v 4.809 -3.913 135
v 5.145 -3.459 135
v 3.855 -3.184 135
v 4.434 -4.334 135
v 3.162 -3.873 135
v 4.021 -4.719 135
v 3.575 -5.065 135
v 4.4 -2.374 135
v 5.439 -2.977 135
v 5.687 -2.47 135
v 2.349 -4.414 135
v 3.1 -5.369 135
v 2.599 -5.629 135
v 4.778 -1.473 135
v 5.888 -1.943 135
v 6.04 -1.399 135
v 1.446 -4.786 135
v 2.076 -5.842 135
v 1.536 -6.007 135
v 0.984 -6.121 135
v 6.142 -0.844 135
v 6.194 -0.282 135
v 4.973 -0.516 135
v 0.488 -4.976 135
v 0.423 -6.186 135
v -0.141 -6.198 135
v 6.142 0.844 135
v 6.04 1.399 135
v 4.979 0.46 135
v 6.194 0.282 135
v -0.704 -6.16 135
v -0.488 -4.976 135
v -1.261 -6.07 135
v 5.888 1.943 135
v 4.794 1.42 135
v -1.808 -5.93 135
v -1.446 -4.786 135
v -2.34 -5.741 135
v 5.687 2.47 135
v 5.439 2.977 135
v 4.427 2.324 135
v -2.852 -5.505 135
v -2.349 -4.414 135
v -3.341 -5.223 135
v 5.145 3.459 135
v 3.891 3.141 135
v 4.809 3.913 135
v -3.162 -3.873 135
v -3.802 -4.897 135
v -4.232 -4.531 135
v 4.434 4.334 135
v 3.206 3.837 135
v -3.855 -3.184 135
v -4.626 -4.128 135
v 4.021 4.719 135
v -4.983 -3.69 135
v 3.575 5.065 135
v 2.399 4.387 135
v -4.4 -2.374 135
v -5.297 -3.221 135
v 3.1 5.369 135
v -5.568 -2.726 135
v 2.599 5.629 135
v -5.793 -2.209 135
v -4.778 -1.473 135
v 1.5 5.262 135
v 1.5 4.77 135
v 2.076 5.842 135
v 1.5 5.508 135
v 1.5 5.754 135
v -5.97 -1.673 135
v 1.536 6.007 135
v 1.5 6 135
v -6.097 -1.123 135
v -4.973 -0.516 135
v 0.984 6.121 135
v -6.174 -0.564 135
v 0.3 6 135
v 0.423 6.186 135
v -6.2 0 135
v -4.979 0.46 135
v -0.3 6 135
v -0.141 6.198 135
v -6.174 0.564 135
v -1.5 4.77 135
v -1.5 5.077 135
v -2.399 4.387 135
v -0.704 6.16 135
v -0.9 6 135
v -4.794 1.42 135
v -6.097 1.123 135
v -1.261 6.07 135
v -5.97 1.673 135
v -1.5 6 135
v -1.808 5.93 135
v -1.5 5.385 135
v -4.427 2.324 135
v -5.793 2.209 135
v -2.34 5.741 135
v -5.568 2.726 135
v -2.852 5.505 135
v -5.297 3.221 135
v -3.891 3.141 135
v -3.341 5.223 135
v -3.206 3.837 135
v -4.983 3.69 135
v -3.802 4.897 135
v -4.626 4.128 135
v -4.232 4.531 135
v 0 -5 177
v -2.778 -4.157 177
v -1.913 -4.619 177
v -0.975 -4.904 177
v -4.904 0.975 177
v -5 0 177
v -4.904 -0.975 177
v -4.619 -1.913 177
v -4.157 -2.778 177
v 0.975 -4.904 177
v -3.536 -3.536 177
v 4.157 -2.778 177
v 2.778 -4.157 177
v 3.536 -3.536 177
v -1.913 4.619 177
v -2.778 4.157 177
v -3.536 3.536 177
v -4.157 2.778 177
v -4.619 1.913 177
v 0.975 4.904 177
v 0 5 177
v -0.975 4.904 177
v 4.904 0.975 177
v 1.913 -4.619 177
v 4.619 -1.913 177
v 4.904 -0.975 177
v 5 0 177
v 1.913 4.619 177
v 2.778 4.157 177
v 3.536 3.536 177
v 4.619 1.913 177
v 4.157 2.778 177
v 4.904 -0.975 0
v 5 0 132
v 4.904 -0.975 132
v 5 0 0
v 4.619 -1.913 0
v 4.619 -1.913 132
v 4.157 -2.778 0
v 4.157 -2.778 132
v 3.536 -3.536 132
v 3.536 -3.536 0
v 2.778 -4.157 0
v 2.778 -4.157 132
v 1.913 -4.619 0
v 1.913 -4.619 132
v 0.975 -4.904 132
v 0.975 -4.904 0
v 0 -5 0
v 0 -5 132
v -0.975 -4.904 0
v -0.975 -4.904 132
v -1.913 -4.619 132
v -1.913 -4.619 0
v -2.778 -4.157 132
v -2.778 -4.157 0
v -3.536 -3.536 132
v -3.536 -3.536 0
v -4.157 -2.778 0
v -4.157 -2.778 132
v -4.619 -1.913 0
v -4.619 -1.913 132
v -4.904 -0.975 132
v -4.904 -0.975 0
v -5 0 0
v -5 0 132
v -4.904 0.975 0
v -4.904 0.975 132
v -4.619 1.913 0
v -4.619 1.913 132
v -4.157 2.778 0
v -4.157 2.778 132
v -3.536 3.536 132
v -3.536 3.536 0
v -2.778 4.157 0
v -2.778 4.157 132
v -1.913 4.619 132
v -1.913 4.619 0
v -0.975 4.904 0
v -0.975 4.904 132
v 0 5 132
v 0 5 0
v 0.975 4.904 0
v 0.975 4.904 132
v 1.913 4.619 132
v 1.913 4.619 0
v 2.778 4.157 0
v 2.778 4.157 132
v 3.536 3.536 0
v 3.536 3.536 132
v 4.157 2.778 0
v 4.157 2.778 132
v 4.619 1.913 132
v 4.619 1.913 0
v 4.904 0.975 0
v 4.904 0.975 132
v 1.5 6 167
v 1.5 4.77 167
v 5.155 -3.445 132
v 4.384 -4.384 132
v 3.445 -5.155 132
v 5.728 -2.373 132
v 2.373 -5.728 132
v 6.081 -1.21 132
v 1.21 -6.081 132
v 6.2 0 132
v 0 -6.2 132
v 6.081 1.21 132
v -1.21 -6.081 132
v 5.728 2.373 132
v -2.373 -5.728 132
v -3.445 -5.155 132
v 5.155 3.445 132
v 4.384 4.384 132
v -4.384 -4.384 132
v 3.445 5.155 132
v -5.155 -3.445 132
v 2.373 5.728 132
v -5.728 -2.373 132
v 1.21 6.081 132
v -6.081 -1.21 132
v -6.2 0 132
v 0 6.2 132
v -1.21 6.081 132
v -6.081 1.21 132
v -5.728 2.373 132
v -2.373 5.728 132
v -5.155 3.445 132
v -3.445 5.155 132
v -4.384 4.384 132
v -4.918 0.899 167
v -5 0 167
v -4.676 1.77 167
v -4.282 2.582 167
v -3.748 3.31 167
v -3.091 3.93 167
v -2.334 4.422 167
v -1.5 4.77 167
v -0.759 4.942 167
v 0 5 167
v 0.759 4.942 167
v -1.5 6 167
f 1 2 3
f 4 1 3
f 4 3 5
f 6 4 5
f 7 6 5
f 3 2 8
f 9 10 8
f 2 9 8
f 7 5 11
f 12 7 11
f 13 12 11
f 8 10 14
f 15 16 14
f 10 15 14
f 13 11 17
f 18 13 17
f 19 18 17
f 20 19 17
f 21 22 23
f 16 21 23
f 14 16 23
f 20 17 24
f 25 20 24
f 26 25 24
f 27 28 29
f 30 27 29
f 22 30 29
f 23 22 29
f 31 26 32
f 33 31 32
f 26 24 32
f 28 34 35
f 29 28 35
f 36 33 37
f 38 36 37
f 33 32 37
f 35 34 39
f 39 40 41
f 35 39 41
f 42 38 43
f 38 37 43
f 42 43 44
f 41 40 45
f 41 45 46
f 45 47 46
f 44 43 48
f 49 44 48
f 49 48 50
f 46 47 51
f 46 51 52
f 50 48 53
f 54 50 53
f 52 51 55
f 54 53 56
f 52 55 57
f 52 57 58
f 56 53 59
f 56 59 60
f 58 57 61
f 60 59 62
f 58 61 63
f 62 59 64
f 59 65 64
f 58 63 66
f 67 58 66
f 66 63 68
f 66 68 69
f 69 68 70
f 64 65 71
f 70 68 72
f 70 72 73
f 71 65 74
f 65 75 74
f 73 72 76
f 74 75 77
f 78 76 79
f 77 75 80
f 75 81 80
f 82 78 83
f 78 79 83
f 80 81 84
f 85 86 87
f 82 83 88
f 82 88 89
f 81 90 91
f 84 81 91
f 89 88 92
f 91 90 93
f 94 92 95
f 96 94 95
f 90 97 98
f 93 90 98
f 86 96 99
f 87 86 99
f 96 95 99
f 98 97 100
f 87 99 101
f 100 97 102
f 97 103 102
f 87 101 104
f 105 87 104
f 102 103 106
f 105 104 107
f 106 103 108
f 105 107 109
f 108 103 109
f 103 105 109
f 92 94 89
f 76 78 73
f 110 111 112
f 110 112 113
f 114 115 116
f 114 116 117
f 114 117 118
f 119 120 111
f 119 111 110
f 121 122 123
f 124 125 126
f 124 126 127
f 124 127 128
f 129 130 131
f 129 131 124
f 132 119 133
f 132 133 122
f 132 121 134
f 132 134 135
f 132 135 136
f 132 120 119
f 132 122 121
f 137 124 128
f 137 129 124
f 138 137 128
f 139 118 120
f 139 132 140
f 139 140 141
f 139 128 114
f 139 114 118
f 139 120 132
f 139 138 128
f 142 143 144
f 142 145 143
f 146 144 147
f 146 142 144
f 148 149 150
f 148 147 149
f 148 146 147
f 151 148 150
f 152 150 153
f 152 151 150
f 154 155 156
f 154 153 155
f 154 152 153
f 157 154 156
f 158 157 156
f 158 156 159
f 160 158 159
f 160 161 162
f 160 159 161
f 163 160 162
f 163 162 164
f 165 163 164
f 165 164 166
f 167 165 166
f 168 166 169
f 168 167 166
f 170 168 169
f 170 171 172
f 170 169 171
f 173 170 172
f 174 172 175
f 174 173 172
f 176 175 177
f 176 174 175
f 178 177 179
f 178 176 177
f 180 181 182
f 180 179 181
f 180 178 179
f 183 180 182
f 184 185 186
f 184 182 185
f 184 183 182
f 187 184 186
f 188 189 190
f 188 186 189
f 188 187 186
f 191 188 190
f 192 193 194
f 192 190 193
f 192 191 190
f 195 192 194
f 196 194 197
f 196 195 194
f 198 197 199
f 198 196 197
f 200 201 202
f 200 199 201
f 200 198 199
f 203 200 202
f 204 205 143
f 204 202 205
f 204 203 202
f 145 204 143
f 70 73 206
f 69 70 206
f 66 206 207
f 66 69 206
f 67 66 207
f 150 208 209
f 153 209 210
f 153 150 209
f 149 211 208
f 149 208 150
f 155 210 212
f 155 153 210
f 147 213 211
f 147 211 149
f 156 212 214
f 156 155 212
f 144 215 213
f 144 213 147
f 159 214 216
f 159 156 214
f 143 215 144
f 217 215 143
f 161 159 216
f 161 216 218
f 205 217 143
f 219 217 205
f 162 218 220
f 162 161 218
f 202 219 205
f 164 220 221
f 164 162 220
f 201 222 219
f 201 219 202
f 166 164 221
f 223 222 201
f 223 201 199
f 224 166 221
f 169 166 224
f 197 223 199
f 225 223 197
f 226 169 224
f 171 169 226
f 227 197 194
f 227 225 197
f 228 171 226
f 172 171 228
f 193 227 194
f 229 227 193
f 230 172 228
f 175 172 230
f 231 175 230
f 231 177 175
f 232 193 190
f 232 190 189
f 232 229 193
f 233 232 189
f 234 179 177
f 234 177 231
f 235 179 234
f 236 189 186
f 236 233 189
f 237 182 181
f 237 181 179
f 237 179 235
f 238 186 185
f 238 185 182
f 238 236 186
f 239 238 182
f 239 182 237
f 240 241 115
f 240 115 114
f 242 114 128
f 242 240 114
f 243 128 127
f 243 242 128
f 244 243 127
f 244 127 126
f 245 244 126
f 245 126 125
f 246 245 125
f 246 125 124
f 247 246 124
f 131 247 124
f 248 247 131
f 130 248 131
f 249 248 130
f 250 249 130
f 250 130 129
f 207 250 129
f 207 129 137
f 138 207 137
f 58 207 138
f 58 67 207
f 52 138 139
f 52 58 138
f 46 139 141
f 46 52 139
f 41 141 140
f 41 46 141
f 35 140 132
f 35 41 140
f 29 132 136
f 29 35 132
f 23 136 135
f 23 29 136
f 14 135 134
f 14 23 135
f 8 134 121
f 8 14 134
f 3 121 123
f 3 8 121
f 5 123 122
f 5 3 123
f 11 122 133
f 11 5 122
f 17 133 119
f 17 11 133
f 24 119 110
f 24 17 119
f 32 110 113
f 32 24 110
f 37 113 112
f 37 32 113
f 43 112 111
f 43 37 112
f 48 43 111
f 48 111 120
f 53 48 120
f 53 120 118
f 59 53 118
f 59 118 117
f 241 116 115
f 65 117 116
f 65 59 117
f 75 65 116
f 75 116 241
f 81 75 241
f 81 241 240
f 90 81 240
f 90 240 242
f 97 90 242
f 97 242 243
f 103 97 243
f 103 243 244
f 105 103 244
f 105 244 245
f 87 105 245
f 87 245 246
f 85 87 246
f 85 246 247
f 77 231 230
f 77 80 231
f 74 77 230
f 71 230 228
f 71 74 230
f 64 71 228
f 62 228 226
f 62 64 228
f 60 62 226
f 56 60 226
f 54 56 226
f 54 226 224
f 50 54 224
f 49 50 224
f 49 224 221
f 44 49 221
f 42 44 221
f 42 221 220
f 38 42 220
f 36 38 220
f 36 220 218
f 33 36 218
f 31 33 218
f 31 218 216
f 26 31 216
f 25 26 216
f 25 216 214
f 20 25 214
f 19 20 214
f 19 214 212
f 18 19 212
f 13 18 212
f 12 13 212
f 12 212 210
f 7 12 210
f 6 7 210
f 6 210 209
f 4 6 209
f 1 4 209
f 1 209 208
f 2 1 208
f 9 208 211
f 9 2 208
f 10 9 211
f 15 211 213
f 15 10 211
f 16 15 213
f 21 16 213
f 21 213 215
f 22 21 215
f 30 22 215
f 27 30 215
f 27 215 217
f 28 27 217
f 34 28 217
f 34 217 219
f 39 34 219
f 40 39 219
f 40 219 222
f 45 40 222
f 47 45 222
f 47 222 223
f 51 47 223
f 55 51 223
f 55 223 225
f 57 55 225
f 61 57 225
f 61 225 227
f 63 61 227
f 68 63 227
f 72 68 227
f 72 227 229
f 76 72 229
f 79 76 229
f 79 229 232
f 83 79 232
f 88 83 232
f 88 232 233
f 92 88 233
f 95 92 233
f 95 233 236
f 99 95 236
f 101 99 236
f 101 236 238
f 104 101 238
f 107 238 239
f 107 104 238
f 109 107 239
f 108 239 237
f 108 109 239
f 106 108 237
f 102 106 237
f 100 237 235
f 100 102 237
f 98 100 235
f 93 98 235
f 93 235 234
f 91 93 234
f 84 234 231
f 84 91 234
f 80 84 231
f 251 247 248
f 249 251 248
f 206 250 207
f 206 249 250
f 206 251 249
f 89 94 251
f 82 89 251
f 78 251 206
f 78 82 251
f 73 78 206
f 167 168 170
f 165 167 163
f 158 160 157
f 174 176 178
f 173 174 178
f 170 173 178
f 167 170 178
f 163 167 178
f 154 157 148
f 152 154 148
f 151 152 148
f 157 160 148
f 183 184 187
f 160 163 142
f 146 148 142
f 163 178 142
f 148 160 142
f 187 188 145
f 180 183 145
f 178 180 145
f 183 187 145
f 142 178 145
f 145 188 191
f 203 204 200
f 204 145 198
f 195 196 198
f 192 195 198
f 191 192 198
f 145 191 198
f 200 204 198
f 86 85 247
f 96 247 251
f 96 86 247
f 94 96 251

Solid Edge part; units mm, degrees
sketch "Sketch1" plane through (0, 0, 0) normal (0, 0, 1) x (1, 0, 0)
  circle A0 centre (0, 0) radius 5
extrude "Protrusion1" add sketch "Sketch1" along normal blind 25
sketch "Sketch2" plane through (0, 0.5, 25) normal (0, 0, 1) x (1, 0, 0)
  circle A0 centre (0, -0.5) radius 5
  dimension "D1" = 10
extrude "ExtrudedProtrusion_2" add sketch "Sketch2" along normal blind 110
sketch "Sketch3" plane through (0, 0, 135) normal (0, 0, 1) x (0, 1, 0)
  line L0 (4, 1.5) -> (6, 1.5)
  line L1 (6, 1.5) -> (6, -1.5)
  line L2 (6, -1.5) -> (4, -1.5)
  line L3 (4, -1.5) -> (4, 1.5)
  circle A0 centre (0, 0) radius 5
extrude "ExtrudedProtrusion_4" add sketch "Sketch3" along normal blind 32
sketch "Sketch4" plane through (0, 0.5, 167) normal (0, 0, 1) x (-1, 0, 0)
  circle A0 centre (0, 0.5) radius 5
  dimension "D1" = 10
extrude "ExtrudedProtrusion_5" add sketch "Sketch4" along normal blind 10
sketch "Sketch5" plane through (0, 5.3848, 135) normal (0, 0, -1) x (-1, 0, 0)
  circle A0 centre (0, -5.3848) radius 6.2
  dimension "D1" = 12.4
extrude "ExtrudedProtrusion_6" add sketch "Sketch5" along normal blind 3
properties material "Aluminum, 1060"
